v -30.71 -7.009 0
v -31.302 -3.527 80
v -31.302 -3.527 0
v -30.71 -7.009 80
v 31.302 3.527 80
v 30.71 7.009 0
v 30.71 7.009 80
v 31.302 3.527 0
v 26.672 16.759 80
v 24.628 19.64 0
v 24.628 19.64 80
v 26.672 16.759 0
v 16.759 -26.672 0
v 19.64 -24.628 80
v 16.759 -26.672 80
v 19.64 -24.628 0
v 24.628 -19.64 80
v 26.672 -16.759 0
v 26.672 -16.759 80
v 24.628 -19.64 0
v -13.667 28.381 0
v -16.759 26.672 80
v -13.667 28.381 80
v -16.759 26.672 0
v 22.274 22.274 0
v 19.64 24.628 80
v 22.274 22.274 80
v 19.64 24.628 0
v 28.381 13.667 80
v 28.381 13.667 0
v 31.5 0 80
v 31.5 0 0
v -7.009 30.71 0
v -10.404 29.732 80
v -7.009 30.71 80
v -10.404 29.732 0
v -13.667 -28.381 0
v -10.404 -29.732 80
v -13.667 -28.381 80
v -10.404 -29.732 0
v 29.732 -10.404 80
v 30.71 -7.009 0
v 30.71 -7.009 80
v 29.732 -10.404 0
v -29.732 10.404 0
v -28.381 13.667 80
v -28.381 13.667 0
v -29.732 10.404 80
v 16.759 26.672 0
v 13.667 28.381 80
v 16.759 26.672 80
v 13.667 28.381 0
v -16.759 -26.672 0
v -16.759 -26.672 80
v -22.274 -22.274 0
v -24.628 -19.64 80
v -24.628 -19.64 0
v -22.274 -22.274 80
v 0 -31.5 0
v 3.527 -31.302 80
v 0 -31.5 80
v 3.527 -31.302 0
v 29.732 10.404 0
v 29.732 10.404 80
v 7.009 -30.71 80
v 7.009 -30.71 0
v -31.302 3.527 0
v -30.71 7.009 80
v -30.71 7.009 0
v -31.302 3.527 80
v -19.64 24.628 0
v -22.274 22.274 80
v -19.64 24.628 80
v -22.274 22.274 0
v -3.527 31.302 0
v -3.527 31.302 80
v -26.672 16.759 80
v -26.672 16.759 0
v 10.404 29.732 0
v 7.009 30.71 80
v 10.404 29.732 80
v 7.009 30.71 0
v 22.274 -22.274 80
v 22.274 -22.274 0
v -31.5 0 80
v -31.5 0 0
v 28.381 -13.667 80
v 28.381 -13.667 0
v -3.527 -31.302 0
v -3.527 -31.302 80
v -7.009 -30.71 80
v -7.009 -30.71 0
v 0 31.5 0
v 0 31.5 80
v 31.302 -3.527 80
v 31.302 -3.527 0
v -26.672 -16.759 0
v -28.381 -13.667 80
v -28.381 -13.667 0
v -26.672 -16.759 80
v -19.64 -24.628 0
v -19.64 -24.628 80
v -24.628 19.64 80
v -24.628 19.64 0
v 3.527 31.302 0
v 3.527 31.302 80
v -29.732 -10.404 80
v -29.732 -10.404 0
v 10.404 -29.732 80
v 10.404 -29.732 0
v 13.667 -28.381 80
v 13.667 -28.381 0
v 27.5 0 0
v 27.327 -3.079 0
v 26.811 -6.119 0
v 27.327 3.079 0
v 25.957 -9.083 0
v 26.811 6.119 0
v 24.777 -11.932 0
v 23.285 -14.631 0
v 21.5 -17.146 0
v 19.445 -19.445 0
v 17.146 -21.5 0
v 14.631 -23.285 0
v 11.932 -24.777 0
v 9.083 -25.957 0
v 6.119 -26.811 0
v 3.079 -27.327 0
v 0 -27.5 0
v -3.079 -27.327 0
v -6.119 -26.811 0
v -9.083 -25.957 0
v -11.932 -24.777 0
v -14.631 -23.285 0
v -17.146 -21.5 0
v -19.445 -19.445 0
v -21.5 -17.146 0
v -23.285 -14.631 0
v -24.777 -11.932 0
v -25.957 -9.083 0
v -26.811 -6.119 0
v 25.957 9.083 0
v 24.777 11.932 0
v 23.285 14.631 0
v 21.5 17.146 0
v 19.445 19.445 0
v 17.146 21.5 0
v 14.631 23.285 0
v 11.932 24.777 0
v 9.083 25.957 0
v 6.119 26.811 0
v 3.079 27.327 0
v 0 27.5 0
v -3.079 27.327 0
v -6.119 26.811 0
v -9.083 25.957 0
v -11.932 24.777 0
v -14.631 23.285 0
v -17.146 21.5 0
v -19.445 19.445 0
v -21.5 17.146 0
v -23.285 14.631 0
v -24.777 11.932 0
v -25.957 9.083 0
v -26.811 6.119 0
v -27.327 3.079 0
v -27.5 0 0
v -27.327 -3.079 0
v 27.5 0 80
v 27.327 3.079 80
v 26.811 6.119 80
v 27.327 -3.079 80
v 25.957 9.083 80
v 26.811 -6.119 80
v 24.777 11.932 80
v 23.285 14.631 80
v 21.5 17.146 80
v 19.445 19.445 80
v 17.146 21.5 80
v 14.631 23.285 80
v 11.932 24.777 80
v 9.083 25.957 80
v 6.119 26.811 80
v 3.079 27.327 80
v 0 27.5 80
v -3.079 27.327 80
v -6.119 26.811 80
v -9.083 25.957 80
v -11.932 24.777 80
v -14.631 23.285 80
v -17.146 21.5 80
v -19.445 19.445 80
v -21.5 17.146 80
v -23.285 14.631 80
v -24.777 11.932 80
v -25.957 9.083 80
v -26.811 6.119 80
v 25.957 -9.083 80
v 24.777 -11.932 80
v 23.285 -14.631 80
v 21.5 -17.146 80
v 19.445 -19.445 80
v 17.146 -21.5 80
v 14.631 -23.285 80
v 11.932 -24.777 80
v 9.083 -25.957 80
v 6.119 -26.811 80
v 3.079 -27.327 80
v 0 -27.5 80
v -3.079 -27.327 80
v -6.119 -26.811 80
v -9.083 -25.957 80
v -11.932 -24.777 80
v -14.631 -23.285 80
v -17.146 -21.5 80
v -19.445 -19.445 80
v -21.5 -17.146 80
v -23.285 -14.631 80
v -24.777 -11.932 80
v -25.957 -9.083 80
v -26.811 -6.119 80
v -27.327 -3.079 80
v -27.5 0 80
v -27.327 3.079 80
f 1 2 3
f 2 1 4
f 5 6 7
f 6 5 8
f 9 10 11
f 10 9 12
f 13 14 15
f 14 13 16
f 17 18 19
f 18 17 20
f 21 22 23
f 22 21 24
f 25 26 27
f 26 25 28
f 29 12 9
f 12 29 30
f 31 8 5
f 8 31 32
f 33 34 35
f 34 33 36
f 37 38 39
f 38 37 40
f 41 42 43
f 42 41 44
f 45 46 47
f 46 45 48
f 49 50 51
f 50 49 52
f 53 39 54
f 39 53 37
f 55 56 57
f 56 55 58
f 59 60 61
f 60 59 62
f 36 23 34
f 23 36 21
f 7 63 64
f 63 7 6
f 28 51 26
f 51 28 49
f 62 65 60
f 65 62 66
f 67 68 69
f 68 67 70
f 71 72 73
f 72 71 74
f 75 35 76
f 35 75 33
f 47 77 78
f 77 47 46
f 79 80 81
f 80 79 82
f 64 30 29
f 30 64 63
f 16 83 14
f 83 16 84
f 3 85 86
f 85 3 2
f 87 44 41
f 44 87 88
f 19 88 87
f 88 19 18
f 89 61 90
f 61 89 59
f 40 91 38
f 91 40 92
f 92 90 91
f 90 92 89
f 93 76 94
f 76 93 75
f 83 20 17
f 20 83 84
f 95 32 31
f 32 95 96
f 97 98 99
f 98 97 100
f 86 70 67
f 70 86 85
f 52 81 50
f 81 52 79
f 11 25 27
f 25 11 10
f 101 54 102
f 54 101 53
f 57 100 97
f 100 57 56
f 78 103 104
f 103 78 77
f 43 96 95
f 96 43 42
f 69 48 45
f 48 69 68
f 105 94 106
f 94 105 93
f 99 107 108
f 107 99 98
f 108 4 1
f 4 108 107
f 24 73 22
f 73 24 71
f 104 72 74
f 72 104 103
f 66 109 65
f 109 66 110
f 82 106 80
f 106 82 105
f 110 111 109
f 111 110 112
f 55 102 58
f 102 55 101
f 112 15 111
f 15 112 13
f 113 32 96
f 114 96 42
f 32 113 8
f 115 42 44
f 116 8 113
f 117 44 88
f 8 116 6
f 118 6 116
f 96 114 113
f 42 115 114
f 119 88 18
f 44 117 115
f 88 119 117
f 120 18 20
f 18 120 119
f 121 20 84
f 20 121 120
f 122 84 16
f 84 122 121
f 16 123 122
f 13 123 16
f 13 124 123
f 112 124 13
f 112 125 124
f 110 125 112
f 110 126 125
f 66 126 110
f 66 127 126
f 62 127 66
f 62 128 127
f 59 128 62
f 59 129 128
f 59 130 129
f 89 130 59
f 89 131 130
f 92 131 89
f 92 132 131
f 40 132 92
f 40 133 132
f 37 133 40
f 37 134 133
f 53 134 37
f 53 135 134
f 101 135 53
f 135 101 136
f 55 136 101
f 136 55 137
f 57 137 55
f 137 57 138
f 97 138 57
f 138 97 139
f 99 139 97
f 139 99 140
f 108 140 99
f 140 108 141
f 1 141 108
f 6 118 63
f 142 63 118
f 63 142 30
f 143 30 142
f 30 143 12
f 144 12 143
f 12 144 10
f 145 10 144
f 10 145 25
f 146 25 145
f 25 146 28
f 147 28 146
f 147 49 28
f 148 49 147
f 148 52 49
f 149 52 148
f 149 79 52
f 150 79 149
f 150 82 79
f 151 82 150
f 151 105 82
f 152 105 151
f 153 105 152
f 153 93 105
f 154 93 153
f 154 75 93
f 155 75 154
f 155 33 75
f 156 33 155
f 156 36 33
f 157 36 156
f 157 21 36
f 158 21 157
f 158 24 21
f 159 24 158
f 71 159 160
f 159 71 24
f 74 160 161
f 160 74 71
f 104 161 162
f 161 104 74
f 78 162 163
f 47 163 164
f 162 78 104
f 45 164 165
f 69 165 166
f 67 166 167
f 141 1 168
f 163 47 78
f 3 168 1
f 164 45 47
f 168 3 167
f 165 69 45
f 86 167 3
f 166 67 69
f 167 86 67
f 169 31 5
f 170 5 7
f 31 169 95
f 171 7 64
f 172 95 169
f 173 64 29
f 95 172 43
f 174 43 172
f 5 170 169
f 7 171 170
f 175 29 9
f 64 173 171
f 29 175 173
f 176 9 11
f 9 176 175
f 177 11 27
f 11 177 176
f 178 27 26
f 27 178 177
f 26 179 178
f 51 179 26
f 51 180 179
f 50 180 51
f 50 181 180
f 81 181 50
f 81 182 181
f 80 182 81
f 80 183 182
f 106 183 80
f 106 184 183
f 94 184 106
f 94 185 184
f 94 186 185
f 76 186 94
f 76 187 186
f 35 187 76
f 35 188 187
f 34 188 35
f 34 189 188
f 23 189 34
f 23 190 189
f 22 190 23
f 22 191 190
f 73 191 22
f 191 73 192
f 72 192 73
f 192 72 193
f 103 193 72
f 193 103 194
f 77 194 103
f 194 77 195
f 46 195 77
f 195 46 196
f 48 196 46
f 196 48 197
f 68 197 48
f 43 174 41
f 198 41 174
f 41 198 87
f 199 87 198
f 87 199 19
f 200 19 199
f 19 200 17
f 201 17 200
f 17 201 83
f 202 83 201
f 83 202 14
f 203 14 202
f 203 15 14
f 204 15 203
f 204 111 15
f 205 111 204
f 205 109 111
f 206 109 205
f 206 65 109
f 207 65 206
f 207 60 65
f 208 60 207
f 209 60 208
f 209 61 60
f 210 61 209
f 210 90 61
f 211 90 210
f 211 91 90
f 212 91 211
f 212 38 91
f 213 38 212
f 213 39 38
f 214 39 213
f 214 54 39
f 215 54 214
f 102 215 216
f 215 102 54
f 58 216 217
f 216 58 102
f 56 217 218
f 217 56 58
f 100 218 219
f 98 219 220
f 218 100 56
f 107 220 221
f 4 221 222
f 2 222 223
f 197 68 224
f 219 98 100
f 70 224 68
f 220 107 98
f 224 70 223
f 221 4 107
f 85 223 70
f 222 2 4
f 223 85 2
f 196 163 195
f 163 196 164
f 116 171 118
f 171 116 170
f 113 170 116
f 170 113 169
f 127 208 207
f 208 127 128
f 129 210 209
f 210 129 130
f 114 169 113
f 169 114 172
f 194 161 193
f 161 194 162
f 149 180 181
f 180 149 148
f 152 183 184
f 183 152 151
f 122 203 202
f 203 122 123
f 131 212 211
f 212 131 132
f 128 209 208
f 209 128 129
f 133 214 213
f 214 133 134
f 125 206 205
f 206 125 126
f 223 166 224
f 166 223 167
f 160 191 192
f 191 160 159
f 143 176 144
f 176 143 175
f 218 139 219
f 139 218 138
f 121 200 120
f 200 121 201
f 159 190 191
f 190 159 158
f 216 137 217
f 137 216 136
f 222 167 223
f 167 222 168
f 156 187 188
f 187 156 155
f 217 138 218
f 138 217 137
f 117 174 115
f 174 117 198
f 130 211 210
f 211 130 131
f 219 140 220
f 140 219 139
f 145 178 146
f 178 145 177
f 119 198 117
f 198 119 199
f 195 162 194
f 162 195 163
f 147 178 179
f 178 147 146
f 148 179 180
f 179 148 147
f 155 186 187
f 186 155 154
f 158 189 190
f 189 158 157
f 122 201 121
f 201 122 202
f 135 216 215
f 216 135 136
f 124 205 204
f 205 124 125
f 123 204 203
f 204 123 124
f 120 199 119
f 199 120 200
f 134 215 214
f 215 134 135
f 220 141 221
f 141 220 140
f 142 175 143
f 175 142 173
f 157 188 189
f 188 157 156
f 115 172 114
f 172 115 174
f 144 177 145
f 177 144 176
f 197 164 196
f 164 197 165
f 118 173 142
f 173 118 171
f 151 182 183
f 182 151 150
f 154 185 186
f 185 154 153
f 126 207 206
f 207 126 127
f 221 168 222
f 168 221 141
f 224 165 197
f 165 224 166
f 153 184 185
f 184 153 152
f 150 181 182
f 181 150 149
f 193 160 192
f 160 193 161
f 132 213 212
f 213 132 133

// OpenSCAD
// file: module_common.scad
// IGNORE (marked 2026-11-11): does not match the simulated design. This placeholder uses 84 mm shells + 12 mm pin joints;
// the design uses continuous 96 mm modules with a full-length 1.8 mm NiTi rod in each M module. See NOT_THE_SIMULATED_DESIGN.md.
// Shared geometry library for the numbered full-length proof-of-motion parts.
// Module pitch matches the study's 96 mm; printed shell is 84 mm with a 12 mm
// joint allowance between successive pin centers. These are generic shells,
// not mechanically equivalent replicas of the simulated PA12/NiTi modules.

module_pitch = 96;
shell_length = 84;
body_diameter = 63;
shell_wall = 4;
end_plate = 4;
guide_radius = 24;
guide_hole_d = 3.2;
pivot_hole_d = 3.4; // M3 pin/bolt clearance
head_ring_length = 16;
head_placeholder_length = 80; // envelope only; actual head CAD is unknown

$fn = 56;

function rotate_x_point(p,a) = [p[0],p[1]*cos(a)-p[2]*sin(a),p[1]*sin(a)+p[2]*cos(a)];

module axial_hole(x,y,d,h,z0) {
    translate([x,y,z0]) cylinder(d=d,h=h);
}

module guide_holes(z0,h) {
    for (a=[0:90:270])
        axial_hole(guide_radius*cos(a),guide_radius*sin(a),guide_hole_d,h,z0);
}

module cable_segment(a,b,d=1.2,c=[0.82,0.52,0.12]) {
    v=[b[0]-a[0],b[1]-a[1],b[2]-a[2]];
    len=norm(v);
    if (len>0.01)
        color(c) translate(a)
            rotate([0,acos(v[2]/len),atan2(v[1],v[0])]) cylinder(d=d,h=len);
}

module cable_run_in_link(z0=6,z1=90,show_tendons=true) {
    if (show_tendons)
        for (a=[0:90:270]) {
            col=(a==90)?[0.82,0.52,0.12]:[0.30,0.34,0.40,0.72];
            cable_segment([guide_radius*cos(a),guide_radius*sin(a),z0],
                          [guide_radius*cos(a),guide_radius*sin(a),z1],1.2,col);
        }
}

module joint_cable_bridge(angle_deg=0,show_tendons=true) {
    // Bridges the 12 mm joint allowance between the adjacent module guide exits.
    if (show_tendons)
        for (a=[0:90:270]) {
            p0=[guide_radius*cos(a),guide_radius*sin(a),-6];
            p1=rotate_x_point([guide_radius*cos(a),guide_radius*sin(a),6],angle_deg);
            col=(a==90)?[0.82,0.52,0.12]:[0.30,0.34,0.40,0.72];
            cable_segment(p0,p1,1.2,col);
        }
}

module shell_body(label="U") {
    difference() {
        cylinder(d=body_diameter,h=shell_length);
        translate([0,0,end_plate])
            cylinder(d=body_diameter-2*shell_wall,h=shell_length-2*end_plate);
        axial_hole(0,0,14,shell_length+0.2,-0.1);
        guide_holes(-0.1,shell_length+0.2);
        translate([-12,-2,shell_length-0.8])
            linear_extrude(height=1) text(label,size=5,halign="center",valign="center");
    }
}

module module_link(kind="U",number=1,base=false,tip=false,show_tendons=true) {
    module_color=(kind=="U")?[0.29,0.44,0.72]:[0.22,0.62,0.53];
    color(module_color) {
        // The shell spans z=6..90 in the 96 mm pivot-to-pivot module pitch.
        translate([0,0,6]) shell_body(kind);

        if (base) {
            // Flat base flange; holes are for a low-load test stand only.
            difference() {
                cylinder(d=body_diameter,h=6);
                axial_hole(0,0,14,6.2,-0.1);
                guide_holes(-0.1,6.2);
                for (a=[45:90:315]) axial_hole(18*cos(a),18*sin(a),3.4,6.2,-0.1);
            }
        } else {
            // Input tongue. It sits between the preceding link's clevis ears.
            difference() {
                union() {
                    translate([-6,-9,-6]) cube([12,18,12]);
                    translate([-6,-7,4]) cube([12,14,2]);
                }
                translate([-7,0,0]) rotate([0,90,0]) cylinder(d=pivot_hole_d,h=14);
            }
        }

        if (tip) {
            // Distal cord anchor ring at the terminal pivot.
            translate([0,0,90]) difference() {
                cylinder(d=body_diameter,h=head_ring_length);
                translate([0,0,-0.1]) cylinder(d=body_diameter-2*shell_wall,h=head_ring_length+0.2);
                axial_hole(0,0,14,head_ring_length+0.2,-0.1);
                guide_holes(-0.1,head_ring_length+0.2);
                for (a=[0:90:270])
                    translate([guide_radius*cos(a),guide_radius*sin(a),head_ring_length-3])
                        cube([5,5,4],center=true);
            }
        } else {
            // Output clevis, pin axis along X; it mates to the next link's tongue.
            for (x=[-9,9]) difference() {
                translate([x-3,-12,90]) cube([6,24,12]);
                translate([x-4,0,module_pitch]) rotate([0,90,0])
                    cylinder(d=pivot_hole_d,h=8);
            }
        }
    }
    cable_run_in_link(6,90,show_tendons);
    if (show_tendons && tip)
        for (a=[0:90:270])
            cable_segment([guide_radius*cos(a),guide_radius*sin(a),90],
                          [guide_radius*cos(a),guide_radius*sin(a),90+head_ring_length],1.2,
                          (a==90)?[0.82,0.52,0.12]:[0.30,0.34,0.40,0.72]);
}

module base_interface() {
    // 20 mm length from the study; outside shape is an envelope pending real CAD.
    difference() {
        cylinder(d=body_diameter,h=20);
        translate([0,0,-0.1]) cylinder(d=body_diameter-2*shell_wall,h=20.2);
        axial_hole(0,0,14,20.2,-0.1);
        guide_holes(-0.1,20.2);
        for (a=[45:90:315]) axial_hole(18*cos(a),18*sin(a),3.4,20.2,-0.1);
    }
}

module head_placeholder() {
    // Illustrative 63 mm envelope only; this does not represent the 500 g head CAD.
    difference() {
        cylinder(d=body_diameter,h=head_placeholder_length);
        translate([0,0,-0.1]) cylinder(d=body_diameter-2*shell_wall,h=head_placeholder_length+0.2);
        axial_hole(0,0,14,head_placeholder_length+0.2,-0.1);
    }
}
// main file
// IGNORE (marked 2026-11-11): does not match the simulated design. This placeholder uses 84 mm shells + 12 mm pin joints;
// the design uses continuous 96 mm modules with a full-length 1.8 mm NiTi rod in each M module. See NOT_THE_SIMULATED_DESIGN.md.
include <module_common.scad>;
head_placeholder();
